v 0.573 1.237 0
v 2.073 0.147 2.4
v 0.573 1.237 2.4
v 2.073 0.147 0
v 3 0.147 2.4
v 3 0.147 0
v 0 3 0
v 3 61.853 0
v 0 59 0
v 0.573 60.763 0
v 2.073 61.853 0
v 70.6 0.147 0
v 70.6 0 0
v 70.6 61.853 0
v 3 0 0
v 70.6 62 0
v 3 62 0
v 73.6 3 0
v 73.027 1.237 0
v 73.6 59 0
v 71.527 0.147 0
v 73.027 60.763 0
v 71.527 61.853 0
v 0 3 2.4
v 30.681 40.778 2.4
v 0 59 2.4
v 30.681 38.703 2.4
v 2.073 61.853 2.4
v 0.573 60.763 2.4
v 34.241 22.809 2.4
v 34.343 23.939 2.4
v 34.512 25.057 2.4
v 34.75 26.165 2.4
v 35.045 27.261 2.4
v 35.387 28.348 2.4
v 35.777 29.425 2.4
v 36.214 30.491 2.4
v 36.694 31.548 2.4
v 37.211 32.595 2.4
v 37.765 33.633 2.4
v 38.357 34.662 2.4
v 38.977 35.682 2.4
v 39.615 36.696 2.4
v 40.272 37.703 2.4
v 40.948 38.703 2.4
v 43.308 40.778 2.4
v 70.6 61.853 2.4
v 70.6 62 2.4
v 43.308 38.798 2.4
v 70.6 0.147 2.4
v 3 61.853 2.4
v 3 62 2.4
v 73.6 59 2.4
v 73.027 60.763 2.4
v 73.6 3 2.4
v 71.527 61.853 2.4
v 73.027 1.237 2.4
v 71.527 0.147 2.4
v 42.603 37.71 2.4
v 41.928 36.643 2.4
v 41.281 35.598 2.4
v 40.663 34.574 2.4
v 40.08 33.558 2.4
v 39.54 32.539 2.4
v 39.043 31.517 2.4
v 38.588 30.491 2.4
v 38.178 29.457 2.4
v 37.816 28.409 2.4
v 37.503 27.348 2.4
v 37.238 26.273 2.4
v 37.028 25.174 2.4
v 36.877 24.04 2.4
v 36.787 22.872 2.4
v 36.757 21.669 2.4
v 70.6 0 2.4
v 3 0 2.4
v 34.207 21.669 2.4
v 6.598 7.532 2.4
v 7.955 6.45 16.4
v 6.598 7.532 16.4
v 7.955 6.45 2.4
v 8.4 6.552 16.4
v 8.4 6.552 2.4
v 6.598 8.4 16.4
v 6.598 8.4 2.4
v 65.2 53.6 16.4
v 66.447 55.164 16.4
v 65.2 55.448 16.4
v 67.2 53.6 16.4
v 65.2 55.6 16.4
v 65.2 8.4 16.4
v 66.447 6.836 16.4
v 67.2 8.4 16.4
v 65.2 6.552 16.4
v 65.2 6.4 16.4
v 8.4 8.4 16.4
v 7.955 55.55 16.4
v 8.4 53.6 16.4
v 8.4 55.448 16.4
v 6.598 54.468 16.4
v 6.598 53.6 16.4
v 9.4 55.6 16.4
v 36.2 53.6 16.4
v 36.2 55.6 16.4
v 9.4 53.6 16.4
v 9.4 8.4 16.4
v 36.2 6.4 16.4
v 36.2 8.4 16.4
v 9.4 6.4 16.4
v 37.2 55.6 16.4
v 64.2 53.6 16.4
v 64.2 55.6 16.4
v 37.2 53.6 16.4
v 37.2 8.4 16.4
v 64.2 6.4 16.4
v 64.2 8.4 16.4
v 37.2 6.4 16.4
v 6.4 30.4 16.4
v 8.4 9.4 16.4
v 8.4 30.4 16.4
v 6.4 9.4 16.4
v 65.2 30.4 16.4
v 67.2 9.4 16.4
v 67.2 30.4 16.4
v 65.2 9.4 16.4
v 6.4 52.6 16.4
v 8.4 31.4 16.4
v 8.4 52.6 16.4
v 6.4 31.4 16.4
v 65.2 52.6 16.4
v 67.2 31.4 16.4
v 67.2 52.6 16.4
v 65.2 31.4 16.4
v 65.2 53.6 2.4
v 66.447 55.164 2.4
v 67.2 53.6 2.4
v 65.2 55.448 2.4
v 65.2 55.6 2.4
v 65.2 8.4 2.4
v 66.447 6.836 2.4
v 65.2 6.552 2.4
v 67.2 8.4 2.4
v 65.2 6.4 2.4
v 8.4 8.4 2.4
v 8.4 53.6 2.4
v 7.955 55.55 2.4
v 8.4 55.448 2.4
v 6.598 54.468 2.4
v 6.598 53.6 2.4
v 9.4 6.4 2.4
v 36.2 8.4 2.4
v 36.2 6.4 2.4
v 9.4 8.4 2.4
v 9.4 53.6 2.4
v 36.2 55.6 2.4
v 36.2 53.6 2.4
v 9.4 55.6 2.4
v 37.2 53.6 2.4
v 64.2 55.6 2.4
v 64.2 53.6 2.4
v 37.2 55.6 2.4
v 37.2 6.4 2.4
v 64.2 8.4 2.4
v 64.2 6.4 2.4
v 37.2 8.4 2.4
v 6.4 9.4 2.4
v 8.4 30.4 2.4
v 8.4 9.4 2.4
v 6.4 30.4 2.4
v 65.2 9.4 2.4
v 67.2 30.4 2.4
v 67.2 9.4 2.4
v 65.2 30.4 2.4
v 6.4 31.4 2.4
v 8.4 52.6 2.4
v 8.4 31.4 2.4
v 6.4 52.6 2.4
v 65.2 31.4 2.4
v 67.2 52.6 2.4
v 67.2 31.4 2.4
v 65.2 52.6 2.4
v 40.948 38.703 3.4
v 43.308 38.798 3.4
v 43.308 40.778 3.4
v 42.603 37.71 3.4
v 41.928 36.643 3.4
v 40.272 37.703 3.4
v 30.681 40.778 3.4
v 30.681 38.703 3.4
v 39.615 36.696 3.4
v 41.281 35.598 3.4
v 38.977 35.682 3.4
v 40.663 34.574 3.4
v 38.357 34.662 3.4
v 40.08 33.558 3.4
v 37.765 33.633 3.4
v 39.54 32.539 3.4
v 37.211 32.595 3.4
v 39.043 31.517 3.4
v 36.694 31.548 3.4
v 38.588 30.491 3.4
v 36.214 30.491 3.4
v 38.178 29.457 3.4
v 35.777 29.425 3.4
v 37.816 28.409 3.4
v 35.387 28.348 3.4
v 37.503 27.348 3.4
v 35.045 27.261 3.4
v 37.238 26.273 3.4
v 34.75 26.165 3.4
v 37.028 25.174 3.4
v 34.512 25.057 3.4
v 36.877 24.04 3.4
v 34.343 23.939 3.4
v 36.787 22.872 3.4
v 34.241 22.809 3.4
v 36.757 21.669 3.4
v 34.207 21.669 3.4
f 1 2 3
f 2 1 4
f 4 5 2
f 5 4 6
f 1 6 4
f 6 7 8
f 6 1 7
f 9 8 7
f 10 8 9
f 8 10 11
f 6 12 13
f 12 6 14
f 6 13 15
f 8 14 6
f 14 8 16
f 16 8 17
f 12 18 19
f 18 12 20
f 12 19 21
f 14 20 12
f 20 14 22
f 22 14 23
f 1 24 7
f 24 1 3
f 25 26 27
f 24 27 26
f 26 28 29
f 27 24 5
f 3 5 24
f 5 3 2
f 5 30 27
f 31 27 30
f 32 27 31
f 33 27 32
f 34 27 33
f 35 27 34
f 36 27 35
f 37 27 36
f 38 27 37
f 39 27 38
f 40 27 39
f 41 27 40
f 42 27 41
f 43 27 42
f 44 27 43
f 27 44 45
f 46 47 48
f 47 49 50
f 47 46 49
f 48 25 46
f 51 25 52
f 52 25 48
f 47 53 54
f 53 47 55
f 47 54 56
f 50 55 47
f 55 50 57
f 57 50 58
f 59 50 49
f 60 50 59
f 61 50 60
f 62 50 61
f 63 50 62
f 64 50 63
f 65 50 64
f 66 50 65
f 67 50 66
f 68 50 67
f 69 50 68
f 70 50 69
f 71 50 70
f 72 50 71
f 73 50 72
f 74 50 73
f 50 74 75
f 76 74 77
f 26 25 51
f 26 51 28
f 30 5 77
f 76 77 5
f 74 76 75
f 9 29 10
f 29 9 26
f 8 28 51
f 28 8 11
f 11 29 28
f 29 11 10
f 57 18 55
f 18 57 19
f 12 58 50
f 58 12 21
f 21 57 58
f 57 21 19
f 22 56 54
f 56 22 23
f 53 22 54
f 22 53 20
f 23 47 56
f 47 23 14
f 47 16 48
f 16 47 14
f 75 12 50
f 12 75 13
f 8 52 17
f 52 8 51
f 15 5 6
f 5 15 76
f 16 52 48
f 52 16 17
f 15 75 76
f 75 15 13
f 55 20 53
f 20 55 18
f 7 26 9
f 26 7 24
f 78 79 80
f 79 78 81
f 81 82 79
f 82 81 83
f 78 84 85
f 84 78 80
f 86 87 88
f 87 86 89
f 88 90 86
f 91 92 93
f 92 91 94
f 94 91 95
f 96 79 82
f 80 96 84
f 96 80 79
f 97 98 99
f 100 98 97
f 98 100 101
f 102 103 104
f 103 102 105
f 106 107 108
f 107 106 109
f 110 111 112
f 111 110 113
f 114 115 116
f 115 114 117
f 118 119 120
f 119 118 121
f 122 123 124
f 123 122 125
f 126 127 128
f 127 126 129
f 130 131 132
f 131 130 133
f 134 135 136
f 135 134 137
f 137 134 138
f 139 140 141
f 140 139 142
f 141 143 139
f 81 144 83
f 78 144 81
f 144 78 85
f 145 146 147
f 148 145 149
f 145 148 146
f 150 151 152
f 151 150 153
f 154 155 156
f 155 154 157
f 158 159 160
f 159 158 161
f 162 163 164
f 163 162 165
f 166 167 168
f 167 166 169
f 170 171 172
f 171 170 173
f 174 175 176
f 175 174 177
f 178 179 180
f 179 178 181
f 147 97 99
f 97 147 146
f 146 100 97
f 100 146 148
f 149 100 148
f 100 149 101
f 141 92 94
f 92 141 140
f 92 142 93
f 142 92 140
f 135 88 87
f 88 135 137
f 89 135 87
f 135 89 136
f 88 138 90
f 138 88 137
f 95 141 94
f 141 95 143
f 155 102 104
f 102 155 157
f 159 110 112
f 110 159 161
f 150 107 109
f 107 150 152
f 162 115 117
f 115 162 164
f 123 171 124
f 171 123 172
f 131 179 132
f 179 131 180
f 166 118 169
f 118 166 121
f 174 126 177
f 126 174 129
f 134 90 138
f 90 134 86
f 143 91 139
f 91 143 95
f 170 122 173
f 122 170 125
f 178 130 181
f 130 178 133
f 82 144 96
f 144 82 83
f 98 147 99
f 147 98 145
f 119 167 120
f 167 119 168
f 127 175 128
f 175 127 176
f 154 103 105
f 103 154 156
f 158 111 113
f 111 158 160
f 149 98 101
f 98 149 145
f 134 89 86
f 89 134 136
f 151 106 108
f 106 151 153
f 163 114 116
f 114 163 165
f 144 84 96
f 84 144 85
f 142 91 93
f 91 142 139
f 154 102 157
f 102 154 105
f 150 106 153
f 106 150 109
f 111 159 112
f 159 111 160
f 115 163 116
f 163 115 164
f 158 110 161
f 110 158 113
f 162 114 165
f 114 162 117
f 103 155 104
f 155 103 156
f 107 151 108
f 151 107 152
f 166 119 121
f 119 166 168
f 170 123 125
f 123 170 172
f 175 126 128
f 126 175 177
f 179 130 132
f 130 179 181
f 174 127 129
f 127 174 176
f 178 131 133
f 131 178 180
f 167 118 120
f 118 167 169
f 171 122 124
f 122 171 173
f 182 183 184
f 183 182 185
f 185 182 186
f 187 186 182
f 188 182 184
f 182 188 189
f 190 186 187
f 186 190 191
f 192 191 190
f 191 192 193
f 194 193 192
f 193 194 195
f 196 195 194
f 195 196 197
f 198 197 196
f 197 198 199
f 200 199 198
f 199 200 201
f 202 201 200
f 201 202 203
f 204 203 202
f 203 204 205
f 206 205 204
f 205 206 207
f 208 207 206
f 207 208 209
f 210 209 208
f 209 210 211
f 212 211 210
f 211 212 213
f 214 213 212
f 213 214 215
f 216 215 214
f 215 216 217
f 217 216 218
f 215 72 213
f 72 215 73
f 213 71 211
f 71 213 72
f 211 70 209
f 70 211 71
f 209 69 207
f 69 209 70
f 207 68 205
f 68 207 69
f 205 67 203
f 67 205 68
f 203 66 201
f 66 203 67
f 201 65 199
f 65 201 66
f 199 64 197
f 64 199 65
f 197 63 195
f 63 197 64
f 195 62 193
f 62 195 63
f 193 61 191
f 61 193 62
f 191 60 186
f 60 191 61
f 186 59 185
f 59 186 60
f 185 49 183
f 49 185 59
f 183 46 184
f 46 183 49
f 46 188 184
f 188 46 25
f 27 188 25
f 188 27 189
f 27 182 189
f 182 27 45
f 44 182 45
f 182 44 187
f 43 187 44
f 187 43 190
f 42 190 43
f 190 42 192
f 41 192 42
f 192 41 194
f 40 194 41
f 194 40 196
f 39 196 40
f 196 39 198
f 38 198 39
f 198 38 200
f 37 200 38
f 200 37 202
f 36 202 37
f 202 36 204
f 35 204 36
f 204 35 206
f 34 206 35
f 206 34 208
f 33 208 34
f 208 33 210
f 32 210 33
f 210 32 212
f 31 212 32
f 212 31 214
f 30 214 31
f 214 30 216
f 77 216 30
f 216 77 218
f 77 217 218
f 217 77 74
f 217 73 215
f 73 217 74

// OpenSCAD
//
// Parametric Plug Cap with Label
// Adapted by Nicola Rainiero (https://nicolarainiero.altervista.org/en/category/3d-printing/
//
// Based on existing OpenSCAD models (credits to original authors).
// Original sources:
// - https://www.thingiverse.com/thing:894357
//
// Modifications:
// - Added parametric text label on the top surface
// - Adjusted dimensions and tolerances
//

width = 61.6;         // Inner width of the plug
depth = 50.0;         // Inner depth of the plug
height = 2.4;         // Thickness of the plug cover
label = 7;            // Number/text to display on top of the plug

plugHeight = 14;      // Plug height
plugWall = 2;         // Wall thickness
plugRound = 2;
tolerance = 0.4;
wall = 6;             // Thickness of outer walls
round = 3;
plugDistance = 2;
plugDistanceHeight = 0; // Set to 0 to remove protrusions

plugWallSpacer = 1;   // Extra spacing for plug openings
minWallBlock = 15;

/* [Hidden] */

// Calculate external plug dimensions including wall thickness
outerWidth = width + 2 * wall;
outerDepth = depth + 2 * wall;

plugWidth = width - 2 * tolerance;
plugDepth = depth - 2 * tolerance;

plugWidthReal = width;
plugDepthReal = depth;

module cap() {
    // Draw the plug cover with external dimensions
    translate([outerWidth / 2, outerDepth / 2, height / 2]) {
        roundedBox([outerWidth, outerDepth, height], round, true);
    }

    // Draw the inner plug body with cutouts
    translate([wall + tolerance, wall + tolerance, height]) {
        difference() {
            translate([plugWidth / 2, plugDepth / 2, plugHeight / 2]) {
                roundedBox([plugWidth, plugDepth, plugHeight], plugRound, true);

                // Add protrusions (if enabled)
                for (move = [1:plugHeight / plugDistance]) {
                    translate([0, 0, move * plugDistance - plugHeight / 2]) {
                        roundedBox([plugWidthReal, plugDepthReal, plugDistanceHeight], plugRound, true);
                    }
                }
            }

            // Internal cutouts
            translate([plugWall, plugWall, 0])
                cube([plugWidth - (2 * plugWall), plugDepth - 2 * plugWall, plugHeight], center = false);
            translate([plugWall, -tolerance - 5, 0])
                cube([plugWallSpacer, plugDepth + 10, plugHeight], center = false);
            translate([plugWidth - plugWall - plugWallSpacer, -tolerance - 5, 0])
                cube([plugWallSpacer, plugDepth + 10, plugHeight], center = false);

            if ((plugWidthReal / 2) > minWallBlock) {
                translate([plugWidthReal / 2 - plugWallSpacer, -tolerance - 5, 0])
                    cube([plugWallSpacer, plugDepthReal + 10, plugHeight], center = false);
            }

            translate([-tolerance - 5, plugWall, 0])
                cube([plugWidth + 10, plugWallSpacer, plugHeight], center = false);
            translate([-tolerance - 5, plugDepth - plugWall - plugWallSpacer, 0])
                cube([plugWidth + 10, plugWallSpacer, plugHeight], center = false);

            if ((plugDepthReal / 2) > minWallBlock) {
                translate([-tolerance - 5, plugDepthReal / 2 - plugWallSpacer, 0])
                    cube([plugWidthReal + 10, plugWallSpacer, plugHeight], center = false);
            }
        }
    }

    // Add parametric text label on the top surface
    translate([outerWidth / 2, outerDepth / 2, height ])
        linear_extrude(height = 1)
            text(str(label), size = 20, valign = "center", halign = "center", font = "Arial");
}

/*
 * roundedBox([width, height, depth], float radius, bool sidesonly);
 * Example usage:
 * roundedBox([20, 30, 40], 5, true);
 */
module roundedBox(size, radius, sidesonly) {
    rot = [[0, 0, 0], [90, 0, 90], [90, 90, 0]];
    if (sidesonly) {
        cube(size - [2 * radius, 0, 0], true);
        cube(size - [0, 2 * radius, 0], true);
        for (x = [radius - size[0] / 2, -radius + size[0] / 2], y = [radius - size[1] / 2, -radius + size[1] / 2]) {
            translate([x, y, 0]) {
                cylinder(r = radius, h = size[2], center = true);
            }
        }
    } else {
        cube([size[0], size[1] - radius * 2, size[2] - radius * 2], center = true);
        cube([size[0] - radius * 2, size[1], size[2] - radius * 2], center = true);
        cube([size[0] - radius * 2, size[1] - radius * 2, size[2]], center = true);
        for (axis = [0:2]) {
            for (x = [radius - size[axis] / 2, -radius + size[axis] / 2], y = [radius - size[(axis + 1) % 3] / 2, -radius + size[(axis + 1) % 3] / 2]) {
                rotate(rot[axis]) {
                    translate([x, y, 0]) {
                        cylinder(h = size[(axis + 2) % 3] - 2 * radius, r = radius, center = true);
                    }
                }
            }
        }
        for (x = [radius - size[0] / 2, -radius + size[0] / 2], y = [radius - size[1] / 2, -radius + size[1] / 2], z = [radius - size[2] / 2, -radius + size[2] / 2]) {
            translate([x, y, z]) sphere(radius);
        }
    }
}

cap();
